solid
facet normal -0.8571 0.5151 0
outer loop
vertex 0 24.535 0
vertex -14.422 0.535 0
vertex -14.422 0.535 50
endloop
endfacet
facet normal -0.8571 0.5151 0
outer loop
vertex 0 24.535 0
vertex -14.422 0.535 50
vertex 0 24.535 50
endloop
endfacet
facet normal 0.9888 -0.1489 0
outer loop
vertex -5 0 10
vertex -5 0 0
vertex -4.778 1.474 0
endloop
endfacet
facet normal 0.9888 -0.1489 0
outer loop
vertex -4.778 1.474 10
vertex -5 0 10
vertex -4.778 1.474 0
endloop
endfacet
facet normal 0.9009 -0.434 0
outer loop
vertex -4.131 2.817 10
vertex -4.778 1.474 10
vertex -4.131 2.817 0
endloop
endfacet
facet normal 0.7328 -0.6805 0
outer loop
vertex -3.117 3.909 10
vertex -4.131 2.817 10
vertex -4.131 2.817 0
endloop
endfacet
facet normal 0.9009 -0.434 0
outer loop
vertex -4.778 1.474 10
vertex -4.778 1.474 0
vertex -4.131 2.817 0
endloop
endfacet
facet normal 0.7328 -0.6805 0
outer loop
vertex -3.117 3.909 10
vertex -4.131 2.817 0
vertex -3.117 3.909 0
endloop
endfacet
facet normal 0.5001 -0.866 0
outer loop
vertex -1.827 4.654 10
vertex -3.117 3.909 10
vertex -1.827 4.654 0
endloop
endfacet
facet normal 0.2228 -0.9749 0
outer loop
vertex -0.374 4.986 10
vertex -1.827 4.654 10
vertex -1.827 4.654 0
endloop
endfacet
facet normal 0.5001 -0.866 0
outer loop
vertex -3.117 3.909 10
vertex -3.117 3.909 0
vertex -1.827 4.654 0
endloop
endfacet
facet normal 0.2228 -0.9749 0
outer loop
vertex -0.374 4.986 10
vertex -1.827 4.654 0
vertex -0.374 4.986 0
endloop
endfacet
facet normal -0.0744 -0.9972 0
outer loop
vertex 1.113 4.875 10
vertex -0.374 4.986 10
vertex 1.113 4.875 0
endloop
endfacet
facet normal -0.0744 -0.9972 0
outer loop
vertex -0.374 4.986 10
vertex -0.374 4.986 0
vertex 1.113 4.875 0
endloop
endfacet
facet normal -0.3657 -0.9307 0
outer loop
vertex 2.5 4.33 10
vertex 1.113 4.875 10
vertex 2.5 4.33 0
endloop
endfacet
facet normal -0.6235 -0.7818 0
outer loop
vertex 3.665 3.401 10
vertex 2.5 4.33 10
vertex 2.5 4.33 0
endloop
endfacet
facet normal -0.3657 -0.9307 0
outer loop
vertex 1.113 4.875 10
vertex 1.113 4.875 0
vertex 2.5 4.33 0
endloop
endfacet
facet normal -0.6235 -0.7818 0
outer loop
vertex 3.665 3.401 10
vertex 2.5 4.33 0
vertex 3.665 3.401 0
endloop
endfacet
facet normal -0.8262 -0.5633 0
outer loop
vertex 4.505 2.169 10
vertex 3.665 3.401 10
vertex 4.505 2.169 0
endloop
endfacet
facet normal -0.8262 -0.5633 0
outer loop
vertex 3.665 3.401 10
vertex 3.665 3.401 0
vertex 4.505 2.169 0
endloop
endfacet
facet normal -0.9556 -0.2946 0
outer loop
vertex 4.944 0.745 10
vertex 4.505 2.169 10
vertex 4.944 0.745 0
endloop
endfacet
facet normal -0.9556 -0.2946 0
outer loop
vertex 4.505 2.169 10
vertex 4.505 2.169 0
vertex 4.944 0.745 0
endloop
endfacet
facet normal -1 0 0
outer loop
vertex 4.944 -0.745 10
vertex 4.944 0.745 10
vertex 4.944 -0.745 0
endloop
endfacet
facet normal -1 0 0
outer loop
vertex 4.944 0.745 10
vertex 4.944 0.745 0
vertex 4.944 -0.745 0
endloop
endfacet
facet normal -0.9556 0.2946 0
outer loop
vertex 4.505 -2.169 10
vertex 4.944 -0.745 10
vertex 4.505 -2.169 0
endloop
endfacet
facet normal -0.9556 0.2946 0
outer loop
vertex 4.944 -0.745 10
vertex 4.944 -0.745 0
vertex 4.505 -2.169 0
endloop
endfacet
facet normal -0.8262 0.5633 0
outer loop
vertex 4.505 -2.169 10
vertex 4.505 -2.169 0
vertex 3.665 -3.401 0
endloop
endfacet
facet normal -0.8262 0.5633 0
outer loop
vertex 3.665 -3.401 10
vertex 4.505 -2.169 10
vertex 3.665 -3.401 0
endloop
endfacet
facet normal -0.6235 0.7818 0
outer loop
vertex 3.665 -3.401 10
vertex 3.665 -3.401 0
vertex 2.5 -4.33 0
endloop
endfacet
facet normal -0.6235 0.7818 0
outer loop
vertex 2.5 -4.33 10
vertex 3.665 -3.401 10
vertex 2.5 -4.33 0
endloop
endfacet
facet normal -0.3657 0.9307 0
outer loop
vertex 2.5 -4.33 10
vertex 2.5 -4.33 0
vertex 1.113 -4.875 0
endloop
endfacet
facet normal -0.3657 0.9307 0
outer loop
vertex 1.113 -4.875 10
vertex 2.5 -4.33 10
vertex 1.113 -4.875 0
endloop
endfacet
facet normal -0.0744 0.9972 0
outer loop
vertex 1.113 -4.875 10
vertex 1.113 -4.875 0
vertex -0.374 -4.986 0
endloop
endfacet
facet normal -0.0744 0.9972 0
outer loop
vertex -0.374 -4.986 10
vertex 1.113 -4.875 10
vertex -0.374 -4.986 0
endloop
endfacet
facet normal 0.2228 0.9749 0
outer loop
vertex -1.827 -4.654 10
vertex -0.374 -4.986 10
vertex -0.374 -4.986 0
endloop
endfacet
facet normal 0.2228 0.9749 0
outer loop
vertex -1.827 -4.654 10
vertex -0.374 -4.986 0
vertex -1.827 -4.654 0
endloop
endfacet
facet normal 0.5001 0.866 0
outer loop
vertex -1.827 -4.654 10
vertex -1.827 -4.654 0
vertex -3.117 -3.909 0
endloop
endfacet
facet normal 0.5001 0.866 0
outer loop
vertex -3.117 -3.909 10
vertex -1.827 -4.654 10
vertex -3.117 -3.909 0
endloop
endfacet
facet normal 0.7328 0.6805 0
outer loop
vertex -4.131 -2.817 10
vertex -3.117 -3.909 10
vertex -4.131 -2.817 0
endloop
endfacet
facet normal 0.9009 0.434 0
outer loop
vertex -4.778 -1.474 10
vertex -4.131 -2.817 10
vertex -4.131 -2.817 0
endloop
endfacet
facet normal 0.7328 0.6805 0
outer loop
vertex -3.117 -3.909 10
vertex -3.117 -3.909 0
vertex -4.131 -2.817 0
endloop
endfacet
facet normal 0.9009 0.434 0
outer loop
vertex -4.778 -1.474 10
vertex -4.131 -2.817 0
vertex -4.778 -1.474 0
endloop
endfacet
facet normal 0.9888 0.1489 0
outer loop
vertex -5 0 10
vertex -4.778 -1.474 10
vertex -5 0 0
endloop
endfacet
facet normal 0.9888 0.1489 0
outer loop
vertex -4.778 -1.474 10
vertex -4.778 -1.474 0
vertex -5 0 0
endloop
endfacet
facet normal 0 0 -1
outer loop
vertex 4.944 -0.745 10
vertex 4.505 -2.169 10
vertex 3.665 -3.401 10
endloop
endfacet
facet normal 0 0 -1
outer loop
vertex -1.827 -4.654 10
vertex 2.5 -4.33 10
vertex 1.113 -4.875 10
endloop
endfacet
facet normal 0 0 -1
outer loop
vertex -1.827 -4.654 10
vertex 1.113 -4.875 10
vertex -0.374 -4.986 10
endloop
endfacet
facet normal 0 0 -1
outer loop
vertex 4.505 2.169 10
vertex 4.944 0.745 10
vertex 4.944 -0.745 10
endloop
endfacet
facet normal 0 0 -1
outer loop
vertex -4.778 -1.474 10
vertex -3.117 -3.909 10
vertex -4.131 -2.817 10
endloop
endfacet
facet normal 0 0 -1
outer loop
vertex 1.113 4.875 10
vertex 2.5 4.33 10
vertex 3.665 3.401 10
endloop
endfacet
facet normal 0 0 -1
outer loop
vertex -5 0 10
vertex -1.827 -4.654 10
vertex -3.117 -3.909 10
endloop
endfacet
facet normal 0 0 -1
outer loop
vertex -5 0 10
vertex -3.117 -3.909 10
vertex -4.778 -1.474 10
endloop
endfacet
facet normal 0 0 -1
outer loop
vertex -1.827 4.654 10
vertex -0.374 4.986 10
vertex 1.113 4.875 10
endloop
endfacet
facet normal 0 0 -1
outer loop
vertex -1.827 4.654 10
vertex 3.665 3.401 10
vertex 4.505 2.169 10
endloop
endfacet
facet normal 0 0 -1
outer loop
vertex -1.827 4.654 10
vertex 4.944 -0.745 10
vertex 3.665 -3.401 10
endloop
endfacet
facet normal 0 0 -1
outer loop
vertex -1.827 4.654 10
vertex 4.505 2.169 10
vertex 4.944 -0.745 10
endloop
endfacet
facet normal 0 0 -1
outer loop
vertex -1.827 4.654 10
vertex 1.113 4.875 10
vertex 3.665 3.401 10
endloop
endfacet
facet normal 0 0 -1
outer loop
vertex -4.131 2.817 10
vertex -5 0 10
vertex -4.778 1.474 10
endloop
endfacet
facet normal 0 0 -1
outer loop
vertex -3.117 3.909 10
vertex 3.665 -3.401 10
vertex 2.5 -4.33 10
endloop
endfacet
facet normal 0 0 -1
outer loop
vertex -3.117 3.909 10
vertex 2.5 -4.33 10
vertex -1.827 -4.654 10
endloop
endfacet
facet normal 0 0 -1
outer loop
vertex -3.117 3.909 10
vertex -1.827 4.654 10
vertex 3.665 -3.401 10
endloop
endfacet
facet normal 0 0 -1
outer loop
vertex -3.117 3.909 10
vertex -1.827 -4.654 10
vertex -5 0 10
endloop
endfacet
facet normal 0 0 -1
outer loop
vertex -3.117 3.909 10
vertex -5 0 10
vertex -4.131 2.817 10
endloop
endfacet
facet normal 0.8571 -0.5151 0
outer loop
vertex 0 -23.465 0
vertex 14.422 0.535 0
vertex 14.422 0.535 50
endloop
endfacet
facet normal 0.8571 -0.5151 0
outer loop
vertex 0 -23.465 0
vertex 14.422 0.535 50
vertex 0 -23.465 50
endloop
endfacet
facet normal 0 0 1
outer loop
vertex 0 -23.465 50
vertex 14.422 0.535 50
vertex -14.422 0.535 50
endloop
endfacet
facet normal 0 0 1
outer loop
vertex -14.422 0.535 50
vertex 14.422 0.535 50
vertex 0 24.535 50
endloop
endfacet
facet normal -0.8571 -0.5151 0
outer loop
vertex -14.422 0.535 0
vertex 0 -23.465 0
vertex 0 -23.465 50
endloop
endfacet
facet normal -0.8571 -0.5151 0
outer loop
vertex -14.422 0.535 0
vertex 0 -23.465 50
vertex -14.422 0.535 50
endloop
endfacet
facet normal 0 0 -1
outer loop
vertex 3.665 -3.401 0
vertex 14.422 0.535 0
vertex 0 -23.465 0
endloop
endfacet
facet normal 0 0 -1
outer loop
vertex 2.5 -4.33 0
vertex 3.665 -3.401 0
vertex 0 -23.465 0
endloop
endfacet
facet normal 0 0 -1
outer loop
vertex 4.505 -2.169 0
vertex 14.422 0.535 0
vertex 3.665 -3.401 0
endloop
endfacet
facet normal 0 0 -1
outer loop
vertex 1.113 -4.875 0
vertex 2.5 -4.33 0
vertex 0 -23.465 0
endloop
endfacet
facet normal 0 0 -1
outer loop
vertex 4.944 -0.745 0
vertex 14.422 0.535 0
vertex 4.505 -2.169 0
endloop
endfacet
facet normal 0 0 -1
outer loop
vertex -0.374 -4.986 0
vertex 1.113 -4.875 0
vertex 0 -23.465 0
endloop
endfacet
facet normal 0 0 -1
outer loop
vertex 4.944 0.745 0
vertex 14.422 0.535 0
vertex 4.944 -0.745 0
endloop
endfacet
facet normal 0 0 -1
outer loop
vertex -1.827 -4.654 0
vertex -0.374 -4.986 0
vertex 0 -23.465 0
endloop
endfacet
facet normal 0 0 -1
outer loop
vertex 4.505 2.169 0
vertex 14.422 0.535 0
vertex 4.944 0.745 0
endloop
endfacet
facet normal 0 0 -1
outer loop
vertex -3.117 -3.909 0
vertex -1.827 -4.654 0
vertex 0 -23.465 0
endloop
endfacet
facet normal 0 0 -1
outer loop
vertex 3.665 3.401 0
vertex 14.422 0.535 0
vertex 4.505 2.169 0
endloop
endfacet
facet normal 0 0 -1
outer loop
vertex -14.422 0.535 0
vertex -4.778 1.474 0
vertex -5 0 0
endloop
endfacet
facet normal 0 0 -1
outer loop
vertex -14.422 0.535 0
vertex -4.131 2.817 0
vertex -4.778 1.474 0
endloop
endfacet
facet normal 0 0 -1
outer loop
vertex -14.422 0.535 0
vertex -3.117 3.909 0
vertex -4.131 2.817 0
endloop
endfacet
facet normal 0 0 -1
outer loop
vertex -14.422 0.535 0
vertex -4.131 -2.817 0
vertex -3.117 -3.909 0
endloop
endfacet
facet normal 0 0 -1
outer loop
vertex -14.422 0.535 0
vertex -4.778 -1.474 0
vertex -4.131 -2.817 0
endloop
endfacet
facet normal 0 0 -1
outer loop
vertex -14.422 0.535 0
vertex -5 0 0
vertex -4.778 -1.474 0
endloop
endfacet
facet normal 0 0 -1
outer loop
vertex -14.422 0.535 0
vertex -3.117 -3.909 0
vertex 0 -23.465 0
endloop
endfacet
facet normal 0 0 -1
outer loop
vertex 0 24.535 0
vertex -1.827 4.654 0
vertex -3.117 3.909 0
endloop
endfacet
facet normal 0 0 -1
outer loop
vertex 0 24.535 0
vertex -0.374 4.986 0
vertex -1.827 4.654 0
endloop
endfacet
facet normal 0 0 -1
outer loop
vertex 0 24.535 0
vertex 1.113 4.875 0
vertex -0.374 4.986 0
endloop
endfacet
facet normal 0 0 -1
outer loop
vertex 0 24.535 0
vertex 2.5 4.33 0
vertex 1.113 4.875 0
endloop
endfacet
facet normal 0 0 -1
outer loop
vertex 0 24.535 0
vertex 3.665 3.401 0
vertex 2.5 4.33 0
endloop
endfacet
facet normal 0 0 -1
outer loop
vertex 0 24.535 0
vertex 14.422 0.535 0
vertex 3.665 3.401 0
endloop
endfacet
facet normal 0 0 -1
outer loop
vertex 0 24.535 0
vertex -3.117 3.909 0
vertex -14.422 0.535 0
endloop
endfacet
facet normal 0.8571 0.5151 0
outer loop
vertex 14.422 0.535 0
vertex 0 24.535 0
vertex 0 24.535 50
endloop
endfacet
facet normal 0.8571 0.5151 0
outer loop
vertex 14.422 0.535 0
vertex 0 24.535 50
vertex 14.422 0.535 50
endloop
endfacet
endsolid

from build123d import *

# Parameters (mm, degrees)
SALIENTE_EXTRUIR1_DEPTH = 50
CROQUIS2_R              = 5
CORTAR_EXTRUIR1_DEPTH   = 10


with BuildPart() as part:
    # Croquis1 → Saliente-Extruir1 (new body)
    with BuildSketch(Plane.XY):
        Polygon((0, 24.535031847), (14.422205102, 0.535031847), (0, -23.464968153), (-14.422205102, 0.535031847), align=None)
    extrude(amount=SALIENTE_EXTRUIR1_DEPTH)

    # Croquis2 → Cortar-Extruir1 (cut)
    with BuildSketch(Plane(origin=(0, 0, 0), x_dir=(-1, 0, 0), z_dir=(0, 0, -1))):
        Circle(CROQUIS2_R)
    extrude(amount=-CORTAR_EXTRUIR1_DEPTH, mode=Mode.SUBTRACT)


solid = part.part
